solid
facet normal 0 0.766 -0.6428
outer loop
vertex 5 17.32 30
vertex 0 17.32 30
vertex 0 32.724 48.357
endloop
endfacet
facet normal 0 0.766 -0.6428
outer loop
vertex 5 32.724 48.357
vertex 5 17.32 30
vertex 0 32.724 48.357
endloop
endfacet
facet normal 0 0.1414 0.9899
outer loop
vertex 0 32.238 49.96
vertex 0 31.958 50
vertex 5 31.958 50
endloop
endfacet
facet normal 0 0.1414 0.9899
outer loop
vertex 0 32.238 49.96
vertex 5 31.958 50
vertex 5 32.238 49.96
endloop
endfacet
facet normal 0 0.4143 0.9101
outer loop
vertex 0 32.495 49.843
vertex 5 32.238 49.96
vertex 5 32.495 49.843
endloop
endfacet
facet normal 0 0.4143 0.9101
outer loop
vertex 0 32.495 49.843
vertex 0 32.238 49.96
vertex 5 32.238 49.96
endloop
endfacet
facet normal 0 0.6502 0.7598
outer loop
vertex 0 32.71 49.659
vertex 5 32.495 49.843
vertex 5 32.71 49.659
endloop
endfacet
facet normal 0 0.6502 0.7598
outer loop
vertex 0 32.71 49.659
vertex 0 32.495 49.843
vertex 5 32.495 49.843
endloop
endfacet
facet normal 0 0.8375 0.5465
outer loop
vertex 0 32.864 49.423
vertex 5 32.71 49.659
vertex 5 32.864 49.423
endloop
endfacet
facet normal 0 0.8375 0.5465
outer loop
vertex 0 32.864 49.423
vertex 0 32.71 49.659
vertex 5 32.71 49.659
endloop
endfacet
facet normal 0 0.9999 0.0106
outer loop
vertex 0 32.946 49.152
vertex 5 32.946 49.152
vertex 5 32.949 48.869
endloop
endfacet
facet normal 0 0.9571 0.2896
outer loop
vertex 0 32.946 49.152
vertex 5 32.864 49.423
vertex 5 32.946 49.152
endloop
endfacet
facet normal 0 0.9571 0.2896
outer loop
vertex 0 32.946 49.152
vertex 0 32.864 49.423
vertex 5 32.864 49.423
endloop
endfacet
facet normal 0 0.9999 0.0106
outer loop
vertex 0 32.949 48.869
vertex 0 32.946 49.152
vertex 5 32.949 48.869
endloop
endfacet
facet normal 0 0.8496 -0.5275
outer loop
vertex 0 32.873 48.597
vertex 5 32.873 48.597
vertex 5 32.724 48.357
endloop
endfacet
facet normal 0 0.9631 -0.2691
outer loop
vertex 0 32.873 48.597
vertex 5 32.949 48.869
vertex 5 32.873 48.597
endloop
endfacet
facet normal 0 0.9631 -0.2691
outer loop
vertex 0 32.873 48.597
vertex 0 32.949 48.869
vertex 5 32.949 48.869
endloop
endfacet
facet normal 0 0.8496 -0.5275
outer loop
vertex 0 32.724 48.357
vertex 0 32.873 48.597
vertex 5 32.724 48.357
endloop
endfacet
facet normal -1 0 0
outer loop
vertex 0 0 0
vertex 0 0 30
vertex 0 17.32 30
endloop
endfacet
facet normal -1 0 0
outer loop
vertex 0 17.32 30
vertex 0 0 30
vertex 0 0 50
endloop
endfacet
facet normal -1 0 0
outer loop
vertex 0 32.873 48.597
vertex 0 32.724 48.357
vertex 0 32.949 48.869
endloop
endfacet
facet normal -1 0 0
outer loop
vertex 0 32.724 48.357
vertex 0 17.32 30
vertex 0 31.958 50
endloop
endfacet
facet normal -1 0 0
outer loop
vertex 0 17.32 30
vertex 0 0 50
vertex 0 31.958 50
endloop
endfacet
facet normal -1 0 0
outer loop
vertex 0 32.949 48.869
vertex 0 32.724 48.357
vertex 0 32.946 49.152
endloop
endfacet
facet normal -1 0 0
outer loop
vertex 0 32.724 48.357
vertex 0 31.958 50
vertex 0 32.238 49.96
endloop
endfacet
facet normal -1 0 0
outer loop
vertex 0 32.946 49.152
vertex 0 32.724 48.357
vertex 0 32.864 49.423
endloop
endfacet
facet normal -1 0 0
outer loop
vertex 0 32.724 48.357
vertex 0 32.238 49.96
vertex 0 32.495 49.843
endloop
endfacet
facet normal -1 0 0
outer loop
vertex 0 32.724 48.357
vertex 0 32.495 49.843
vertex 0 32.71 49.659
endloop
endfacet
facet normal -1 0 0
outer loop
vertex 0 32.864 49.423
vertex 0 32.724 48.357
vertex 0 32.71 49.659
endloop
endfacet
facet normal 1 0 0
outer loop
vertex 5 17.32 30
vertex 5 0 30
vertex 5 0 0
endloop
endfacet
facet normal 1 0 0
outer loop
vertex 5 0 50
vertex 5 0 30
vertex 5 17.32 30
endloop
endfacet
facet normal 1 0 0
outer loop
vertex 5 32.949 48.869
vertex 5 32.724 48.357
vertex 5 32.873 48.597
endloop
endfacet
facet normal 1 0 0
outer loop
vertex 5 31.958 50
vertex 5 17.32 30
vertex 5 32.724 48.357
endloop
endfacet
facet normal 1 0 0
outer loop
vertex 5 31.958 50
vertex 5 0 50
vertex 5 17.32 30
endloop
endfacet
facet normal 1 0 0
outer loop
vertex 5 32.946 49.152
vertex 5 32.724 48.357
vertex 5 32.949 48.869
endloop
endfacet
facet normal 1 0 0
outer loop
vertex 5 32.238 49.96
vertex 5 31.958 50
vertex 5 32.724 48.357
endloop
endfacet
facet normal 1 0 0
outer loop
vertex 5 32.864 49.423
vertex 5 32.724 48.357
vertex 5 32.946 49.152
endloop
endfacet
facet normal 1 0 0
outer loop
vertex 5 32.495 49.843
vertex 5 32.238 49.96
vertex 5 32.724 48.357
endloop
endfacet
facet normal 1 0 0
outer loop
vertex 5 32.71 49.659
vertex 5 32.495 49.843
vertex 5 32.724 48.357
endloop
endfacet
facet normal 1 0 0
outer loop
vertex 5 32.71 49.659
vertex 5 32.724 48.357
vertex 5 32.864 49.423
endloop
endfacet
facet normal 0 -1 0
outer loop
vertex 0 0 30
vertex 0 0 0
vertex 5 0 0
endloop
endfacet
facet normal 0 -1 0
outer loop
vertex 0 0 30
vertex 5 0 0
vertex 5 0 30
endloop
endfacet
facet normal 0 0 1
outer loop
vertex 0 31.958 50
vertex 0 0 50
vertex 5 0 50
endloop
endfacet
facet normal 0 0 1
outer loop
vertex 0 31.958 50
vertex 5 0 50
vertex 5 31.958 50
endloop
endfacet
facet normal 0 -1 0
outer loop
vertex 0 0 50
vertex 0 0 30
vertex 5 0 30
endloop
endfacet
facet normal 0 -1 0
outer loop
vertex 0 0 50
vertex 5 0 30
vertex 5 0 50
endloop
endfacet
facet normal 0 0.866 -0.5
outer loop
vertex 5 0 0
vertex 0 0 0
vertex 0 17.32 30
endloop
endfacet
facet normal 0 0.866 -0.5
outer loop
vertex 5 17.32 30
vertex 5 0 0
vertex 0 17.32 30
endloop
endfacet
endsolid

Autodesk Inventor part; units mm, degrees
ref_plane "YZ Plane" through (0, 0, 0) normal (1, 0, 0) x (0, 1, 0)
ref_plane "XZ Plane" through (0, 0, 0) normal (0, 1, 0) x (-1, 0, 0)
ref_plane "XY Plane" through (0, 0, 0) normal (0, 0, 1) x (1, 0, 0)
sketch "스케치1" plane through (0, 0, 0) normal (1, 0, 0) x (0, 1, 0)
  line L0 (0, 0) -> (0, 30)
  line L1 (0, 0) -> (30, 0) construction
  line L2 (0, 30) -> (0, 50)
  line L3 (0, 50) -> (31.958, 50)
  line L4 (0, 0) -> (17.3205, 30)
  line L5 (0, 0) -> (34.641, 0) construction
  line L6 (17.3205, 30) -> (32.724, 48.3572)
  arc A0 (32.724, 48.3572) -> (31.958, 50) centre (31.958, 49) ccw
  point P0 (34.1025, 50)
  dimension "d0" = 30
  dimension "d1" = 90
  dimension "d2" = 20
  dimension "d3" = 60
  dimension "d4" = 170
  dimension "d7" = 1
extrude "돌출1" add sketch "스케치1" along normal blind 5
properties part number "앞판바깥막이" material "알루미늄 6061"
